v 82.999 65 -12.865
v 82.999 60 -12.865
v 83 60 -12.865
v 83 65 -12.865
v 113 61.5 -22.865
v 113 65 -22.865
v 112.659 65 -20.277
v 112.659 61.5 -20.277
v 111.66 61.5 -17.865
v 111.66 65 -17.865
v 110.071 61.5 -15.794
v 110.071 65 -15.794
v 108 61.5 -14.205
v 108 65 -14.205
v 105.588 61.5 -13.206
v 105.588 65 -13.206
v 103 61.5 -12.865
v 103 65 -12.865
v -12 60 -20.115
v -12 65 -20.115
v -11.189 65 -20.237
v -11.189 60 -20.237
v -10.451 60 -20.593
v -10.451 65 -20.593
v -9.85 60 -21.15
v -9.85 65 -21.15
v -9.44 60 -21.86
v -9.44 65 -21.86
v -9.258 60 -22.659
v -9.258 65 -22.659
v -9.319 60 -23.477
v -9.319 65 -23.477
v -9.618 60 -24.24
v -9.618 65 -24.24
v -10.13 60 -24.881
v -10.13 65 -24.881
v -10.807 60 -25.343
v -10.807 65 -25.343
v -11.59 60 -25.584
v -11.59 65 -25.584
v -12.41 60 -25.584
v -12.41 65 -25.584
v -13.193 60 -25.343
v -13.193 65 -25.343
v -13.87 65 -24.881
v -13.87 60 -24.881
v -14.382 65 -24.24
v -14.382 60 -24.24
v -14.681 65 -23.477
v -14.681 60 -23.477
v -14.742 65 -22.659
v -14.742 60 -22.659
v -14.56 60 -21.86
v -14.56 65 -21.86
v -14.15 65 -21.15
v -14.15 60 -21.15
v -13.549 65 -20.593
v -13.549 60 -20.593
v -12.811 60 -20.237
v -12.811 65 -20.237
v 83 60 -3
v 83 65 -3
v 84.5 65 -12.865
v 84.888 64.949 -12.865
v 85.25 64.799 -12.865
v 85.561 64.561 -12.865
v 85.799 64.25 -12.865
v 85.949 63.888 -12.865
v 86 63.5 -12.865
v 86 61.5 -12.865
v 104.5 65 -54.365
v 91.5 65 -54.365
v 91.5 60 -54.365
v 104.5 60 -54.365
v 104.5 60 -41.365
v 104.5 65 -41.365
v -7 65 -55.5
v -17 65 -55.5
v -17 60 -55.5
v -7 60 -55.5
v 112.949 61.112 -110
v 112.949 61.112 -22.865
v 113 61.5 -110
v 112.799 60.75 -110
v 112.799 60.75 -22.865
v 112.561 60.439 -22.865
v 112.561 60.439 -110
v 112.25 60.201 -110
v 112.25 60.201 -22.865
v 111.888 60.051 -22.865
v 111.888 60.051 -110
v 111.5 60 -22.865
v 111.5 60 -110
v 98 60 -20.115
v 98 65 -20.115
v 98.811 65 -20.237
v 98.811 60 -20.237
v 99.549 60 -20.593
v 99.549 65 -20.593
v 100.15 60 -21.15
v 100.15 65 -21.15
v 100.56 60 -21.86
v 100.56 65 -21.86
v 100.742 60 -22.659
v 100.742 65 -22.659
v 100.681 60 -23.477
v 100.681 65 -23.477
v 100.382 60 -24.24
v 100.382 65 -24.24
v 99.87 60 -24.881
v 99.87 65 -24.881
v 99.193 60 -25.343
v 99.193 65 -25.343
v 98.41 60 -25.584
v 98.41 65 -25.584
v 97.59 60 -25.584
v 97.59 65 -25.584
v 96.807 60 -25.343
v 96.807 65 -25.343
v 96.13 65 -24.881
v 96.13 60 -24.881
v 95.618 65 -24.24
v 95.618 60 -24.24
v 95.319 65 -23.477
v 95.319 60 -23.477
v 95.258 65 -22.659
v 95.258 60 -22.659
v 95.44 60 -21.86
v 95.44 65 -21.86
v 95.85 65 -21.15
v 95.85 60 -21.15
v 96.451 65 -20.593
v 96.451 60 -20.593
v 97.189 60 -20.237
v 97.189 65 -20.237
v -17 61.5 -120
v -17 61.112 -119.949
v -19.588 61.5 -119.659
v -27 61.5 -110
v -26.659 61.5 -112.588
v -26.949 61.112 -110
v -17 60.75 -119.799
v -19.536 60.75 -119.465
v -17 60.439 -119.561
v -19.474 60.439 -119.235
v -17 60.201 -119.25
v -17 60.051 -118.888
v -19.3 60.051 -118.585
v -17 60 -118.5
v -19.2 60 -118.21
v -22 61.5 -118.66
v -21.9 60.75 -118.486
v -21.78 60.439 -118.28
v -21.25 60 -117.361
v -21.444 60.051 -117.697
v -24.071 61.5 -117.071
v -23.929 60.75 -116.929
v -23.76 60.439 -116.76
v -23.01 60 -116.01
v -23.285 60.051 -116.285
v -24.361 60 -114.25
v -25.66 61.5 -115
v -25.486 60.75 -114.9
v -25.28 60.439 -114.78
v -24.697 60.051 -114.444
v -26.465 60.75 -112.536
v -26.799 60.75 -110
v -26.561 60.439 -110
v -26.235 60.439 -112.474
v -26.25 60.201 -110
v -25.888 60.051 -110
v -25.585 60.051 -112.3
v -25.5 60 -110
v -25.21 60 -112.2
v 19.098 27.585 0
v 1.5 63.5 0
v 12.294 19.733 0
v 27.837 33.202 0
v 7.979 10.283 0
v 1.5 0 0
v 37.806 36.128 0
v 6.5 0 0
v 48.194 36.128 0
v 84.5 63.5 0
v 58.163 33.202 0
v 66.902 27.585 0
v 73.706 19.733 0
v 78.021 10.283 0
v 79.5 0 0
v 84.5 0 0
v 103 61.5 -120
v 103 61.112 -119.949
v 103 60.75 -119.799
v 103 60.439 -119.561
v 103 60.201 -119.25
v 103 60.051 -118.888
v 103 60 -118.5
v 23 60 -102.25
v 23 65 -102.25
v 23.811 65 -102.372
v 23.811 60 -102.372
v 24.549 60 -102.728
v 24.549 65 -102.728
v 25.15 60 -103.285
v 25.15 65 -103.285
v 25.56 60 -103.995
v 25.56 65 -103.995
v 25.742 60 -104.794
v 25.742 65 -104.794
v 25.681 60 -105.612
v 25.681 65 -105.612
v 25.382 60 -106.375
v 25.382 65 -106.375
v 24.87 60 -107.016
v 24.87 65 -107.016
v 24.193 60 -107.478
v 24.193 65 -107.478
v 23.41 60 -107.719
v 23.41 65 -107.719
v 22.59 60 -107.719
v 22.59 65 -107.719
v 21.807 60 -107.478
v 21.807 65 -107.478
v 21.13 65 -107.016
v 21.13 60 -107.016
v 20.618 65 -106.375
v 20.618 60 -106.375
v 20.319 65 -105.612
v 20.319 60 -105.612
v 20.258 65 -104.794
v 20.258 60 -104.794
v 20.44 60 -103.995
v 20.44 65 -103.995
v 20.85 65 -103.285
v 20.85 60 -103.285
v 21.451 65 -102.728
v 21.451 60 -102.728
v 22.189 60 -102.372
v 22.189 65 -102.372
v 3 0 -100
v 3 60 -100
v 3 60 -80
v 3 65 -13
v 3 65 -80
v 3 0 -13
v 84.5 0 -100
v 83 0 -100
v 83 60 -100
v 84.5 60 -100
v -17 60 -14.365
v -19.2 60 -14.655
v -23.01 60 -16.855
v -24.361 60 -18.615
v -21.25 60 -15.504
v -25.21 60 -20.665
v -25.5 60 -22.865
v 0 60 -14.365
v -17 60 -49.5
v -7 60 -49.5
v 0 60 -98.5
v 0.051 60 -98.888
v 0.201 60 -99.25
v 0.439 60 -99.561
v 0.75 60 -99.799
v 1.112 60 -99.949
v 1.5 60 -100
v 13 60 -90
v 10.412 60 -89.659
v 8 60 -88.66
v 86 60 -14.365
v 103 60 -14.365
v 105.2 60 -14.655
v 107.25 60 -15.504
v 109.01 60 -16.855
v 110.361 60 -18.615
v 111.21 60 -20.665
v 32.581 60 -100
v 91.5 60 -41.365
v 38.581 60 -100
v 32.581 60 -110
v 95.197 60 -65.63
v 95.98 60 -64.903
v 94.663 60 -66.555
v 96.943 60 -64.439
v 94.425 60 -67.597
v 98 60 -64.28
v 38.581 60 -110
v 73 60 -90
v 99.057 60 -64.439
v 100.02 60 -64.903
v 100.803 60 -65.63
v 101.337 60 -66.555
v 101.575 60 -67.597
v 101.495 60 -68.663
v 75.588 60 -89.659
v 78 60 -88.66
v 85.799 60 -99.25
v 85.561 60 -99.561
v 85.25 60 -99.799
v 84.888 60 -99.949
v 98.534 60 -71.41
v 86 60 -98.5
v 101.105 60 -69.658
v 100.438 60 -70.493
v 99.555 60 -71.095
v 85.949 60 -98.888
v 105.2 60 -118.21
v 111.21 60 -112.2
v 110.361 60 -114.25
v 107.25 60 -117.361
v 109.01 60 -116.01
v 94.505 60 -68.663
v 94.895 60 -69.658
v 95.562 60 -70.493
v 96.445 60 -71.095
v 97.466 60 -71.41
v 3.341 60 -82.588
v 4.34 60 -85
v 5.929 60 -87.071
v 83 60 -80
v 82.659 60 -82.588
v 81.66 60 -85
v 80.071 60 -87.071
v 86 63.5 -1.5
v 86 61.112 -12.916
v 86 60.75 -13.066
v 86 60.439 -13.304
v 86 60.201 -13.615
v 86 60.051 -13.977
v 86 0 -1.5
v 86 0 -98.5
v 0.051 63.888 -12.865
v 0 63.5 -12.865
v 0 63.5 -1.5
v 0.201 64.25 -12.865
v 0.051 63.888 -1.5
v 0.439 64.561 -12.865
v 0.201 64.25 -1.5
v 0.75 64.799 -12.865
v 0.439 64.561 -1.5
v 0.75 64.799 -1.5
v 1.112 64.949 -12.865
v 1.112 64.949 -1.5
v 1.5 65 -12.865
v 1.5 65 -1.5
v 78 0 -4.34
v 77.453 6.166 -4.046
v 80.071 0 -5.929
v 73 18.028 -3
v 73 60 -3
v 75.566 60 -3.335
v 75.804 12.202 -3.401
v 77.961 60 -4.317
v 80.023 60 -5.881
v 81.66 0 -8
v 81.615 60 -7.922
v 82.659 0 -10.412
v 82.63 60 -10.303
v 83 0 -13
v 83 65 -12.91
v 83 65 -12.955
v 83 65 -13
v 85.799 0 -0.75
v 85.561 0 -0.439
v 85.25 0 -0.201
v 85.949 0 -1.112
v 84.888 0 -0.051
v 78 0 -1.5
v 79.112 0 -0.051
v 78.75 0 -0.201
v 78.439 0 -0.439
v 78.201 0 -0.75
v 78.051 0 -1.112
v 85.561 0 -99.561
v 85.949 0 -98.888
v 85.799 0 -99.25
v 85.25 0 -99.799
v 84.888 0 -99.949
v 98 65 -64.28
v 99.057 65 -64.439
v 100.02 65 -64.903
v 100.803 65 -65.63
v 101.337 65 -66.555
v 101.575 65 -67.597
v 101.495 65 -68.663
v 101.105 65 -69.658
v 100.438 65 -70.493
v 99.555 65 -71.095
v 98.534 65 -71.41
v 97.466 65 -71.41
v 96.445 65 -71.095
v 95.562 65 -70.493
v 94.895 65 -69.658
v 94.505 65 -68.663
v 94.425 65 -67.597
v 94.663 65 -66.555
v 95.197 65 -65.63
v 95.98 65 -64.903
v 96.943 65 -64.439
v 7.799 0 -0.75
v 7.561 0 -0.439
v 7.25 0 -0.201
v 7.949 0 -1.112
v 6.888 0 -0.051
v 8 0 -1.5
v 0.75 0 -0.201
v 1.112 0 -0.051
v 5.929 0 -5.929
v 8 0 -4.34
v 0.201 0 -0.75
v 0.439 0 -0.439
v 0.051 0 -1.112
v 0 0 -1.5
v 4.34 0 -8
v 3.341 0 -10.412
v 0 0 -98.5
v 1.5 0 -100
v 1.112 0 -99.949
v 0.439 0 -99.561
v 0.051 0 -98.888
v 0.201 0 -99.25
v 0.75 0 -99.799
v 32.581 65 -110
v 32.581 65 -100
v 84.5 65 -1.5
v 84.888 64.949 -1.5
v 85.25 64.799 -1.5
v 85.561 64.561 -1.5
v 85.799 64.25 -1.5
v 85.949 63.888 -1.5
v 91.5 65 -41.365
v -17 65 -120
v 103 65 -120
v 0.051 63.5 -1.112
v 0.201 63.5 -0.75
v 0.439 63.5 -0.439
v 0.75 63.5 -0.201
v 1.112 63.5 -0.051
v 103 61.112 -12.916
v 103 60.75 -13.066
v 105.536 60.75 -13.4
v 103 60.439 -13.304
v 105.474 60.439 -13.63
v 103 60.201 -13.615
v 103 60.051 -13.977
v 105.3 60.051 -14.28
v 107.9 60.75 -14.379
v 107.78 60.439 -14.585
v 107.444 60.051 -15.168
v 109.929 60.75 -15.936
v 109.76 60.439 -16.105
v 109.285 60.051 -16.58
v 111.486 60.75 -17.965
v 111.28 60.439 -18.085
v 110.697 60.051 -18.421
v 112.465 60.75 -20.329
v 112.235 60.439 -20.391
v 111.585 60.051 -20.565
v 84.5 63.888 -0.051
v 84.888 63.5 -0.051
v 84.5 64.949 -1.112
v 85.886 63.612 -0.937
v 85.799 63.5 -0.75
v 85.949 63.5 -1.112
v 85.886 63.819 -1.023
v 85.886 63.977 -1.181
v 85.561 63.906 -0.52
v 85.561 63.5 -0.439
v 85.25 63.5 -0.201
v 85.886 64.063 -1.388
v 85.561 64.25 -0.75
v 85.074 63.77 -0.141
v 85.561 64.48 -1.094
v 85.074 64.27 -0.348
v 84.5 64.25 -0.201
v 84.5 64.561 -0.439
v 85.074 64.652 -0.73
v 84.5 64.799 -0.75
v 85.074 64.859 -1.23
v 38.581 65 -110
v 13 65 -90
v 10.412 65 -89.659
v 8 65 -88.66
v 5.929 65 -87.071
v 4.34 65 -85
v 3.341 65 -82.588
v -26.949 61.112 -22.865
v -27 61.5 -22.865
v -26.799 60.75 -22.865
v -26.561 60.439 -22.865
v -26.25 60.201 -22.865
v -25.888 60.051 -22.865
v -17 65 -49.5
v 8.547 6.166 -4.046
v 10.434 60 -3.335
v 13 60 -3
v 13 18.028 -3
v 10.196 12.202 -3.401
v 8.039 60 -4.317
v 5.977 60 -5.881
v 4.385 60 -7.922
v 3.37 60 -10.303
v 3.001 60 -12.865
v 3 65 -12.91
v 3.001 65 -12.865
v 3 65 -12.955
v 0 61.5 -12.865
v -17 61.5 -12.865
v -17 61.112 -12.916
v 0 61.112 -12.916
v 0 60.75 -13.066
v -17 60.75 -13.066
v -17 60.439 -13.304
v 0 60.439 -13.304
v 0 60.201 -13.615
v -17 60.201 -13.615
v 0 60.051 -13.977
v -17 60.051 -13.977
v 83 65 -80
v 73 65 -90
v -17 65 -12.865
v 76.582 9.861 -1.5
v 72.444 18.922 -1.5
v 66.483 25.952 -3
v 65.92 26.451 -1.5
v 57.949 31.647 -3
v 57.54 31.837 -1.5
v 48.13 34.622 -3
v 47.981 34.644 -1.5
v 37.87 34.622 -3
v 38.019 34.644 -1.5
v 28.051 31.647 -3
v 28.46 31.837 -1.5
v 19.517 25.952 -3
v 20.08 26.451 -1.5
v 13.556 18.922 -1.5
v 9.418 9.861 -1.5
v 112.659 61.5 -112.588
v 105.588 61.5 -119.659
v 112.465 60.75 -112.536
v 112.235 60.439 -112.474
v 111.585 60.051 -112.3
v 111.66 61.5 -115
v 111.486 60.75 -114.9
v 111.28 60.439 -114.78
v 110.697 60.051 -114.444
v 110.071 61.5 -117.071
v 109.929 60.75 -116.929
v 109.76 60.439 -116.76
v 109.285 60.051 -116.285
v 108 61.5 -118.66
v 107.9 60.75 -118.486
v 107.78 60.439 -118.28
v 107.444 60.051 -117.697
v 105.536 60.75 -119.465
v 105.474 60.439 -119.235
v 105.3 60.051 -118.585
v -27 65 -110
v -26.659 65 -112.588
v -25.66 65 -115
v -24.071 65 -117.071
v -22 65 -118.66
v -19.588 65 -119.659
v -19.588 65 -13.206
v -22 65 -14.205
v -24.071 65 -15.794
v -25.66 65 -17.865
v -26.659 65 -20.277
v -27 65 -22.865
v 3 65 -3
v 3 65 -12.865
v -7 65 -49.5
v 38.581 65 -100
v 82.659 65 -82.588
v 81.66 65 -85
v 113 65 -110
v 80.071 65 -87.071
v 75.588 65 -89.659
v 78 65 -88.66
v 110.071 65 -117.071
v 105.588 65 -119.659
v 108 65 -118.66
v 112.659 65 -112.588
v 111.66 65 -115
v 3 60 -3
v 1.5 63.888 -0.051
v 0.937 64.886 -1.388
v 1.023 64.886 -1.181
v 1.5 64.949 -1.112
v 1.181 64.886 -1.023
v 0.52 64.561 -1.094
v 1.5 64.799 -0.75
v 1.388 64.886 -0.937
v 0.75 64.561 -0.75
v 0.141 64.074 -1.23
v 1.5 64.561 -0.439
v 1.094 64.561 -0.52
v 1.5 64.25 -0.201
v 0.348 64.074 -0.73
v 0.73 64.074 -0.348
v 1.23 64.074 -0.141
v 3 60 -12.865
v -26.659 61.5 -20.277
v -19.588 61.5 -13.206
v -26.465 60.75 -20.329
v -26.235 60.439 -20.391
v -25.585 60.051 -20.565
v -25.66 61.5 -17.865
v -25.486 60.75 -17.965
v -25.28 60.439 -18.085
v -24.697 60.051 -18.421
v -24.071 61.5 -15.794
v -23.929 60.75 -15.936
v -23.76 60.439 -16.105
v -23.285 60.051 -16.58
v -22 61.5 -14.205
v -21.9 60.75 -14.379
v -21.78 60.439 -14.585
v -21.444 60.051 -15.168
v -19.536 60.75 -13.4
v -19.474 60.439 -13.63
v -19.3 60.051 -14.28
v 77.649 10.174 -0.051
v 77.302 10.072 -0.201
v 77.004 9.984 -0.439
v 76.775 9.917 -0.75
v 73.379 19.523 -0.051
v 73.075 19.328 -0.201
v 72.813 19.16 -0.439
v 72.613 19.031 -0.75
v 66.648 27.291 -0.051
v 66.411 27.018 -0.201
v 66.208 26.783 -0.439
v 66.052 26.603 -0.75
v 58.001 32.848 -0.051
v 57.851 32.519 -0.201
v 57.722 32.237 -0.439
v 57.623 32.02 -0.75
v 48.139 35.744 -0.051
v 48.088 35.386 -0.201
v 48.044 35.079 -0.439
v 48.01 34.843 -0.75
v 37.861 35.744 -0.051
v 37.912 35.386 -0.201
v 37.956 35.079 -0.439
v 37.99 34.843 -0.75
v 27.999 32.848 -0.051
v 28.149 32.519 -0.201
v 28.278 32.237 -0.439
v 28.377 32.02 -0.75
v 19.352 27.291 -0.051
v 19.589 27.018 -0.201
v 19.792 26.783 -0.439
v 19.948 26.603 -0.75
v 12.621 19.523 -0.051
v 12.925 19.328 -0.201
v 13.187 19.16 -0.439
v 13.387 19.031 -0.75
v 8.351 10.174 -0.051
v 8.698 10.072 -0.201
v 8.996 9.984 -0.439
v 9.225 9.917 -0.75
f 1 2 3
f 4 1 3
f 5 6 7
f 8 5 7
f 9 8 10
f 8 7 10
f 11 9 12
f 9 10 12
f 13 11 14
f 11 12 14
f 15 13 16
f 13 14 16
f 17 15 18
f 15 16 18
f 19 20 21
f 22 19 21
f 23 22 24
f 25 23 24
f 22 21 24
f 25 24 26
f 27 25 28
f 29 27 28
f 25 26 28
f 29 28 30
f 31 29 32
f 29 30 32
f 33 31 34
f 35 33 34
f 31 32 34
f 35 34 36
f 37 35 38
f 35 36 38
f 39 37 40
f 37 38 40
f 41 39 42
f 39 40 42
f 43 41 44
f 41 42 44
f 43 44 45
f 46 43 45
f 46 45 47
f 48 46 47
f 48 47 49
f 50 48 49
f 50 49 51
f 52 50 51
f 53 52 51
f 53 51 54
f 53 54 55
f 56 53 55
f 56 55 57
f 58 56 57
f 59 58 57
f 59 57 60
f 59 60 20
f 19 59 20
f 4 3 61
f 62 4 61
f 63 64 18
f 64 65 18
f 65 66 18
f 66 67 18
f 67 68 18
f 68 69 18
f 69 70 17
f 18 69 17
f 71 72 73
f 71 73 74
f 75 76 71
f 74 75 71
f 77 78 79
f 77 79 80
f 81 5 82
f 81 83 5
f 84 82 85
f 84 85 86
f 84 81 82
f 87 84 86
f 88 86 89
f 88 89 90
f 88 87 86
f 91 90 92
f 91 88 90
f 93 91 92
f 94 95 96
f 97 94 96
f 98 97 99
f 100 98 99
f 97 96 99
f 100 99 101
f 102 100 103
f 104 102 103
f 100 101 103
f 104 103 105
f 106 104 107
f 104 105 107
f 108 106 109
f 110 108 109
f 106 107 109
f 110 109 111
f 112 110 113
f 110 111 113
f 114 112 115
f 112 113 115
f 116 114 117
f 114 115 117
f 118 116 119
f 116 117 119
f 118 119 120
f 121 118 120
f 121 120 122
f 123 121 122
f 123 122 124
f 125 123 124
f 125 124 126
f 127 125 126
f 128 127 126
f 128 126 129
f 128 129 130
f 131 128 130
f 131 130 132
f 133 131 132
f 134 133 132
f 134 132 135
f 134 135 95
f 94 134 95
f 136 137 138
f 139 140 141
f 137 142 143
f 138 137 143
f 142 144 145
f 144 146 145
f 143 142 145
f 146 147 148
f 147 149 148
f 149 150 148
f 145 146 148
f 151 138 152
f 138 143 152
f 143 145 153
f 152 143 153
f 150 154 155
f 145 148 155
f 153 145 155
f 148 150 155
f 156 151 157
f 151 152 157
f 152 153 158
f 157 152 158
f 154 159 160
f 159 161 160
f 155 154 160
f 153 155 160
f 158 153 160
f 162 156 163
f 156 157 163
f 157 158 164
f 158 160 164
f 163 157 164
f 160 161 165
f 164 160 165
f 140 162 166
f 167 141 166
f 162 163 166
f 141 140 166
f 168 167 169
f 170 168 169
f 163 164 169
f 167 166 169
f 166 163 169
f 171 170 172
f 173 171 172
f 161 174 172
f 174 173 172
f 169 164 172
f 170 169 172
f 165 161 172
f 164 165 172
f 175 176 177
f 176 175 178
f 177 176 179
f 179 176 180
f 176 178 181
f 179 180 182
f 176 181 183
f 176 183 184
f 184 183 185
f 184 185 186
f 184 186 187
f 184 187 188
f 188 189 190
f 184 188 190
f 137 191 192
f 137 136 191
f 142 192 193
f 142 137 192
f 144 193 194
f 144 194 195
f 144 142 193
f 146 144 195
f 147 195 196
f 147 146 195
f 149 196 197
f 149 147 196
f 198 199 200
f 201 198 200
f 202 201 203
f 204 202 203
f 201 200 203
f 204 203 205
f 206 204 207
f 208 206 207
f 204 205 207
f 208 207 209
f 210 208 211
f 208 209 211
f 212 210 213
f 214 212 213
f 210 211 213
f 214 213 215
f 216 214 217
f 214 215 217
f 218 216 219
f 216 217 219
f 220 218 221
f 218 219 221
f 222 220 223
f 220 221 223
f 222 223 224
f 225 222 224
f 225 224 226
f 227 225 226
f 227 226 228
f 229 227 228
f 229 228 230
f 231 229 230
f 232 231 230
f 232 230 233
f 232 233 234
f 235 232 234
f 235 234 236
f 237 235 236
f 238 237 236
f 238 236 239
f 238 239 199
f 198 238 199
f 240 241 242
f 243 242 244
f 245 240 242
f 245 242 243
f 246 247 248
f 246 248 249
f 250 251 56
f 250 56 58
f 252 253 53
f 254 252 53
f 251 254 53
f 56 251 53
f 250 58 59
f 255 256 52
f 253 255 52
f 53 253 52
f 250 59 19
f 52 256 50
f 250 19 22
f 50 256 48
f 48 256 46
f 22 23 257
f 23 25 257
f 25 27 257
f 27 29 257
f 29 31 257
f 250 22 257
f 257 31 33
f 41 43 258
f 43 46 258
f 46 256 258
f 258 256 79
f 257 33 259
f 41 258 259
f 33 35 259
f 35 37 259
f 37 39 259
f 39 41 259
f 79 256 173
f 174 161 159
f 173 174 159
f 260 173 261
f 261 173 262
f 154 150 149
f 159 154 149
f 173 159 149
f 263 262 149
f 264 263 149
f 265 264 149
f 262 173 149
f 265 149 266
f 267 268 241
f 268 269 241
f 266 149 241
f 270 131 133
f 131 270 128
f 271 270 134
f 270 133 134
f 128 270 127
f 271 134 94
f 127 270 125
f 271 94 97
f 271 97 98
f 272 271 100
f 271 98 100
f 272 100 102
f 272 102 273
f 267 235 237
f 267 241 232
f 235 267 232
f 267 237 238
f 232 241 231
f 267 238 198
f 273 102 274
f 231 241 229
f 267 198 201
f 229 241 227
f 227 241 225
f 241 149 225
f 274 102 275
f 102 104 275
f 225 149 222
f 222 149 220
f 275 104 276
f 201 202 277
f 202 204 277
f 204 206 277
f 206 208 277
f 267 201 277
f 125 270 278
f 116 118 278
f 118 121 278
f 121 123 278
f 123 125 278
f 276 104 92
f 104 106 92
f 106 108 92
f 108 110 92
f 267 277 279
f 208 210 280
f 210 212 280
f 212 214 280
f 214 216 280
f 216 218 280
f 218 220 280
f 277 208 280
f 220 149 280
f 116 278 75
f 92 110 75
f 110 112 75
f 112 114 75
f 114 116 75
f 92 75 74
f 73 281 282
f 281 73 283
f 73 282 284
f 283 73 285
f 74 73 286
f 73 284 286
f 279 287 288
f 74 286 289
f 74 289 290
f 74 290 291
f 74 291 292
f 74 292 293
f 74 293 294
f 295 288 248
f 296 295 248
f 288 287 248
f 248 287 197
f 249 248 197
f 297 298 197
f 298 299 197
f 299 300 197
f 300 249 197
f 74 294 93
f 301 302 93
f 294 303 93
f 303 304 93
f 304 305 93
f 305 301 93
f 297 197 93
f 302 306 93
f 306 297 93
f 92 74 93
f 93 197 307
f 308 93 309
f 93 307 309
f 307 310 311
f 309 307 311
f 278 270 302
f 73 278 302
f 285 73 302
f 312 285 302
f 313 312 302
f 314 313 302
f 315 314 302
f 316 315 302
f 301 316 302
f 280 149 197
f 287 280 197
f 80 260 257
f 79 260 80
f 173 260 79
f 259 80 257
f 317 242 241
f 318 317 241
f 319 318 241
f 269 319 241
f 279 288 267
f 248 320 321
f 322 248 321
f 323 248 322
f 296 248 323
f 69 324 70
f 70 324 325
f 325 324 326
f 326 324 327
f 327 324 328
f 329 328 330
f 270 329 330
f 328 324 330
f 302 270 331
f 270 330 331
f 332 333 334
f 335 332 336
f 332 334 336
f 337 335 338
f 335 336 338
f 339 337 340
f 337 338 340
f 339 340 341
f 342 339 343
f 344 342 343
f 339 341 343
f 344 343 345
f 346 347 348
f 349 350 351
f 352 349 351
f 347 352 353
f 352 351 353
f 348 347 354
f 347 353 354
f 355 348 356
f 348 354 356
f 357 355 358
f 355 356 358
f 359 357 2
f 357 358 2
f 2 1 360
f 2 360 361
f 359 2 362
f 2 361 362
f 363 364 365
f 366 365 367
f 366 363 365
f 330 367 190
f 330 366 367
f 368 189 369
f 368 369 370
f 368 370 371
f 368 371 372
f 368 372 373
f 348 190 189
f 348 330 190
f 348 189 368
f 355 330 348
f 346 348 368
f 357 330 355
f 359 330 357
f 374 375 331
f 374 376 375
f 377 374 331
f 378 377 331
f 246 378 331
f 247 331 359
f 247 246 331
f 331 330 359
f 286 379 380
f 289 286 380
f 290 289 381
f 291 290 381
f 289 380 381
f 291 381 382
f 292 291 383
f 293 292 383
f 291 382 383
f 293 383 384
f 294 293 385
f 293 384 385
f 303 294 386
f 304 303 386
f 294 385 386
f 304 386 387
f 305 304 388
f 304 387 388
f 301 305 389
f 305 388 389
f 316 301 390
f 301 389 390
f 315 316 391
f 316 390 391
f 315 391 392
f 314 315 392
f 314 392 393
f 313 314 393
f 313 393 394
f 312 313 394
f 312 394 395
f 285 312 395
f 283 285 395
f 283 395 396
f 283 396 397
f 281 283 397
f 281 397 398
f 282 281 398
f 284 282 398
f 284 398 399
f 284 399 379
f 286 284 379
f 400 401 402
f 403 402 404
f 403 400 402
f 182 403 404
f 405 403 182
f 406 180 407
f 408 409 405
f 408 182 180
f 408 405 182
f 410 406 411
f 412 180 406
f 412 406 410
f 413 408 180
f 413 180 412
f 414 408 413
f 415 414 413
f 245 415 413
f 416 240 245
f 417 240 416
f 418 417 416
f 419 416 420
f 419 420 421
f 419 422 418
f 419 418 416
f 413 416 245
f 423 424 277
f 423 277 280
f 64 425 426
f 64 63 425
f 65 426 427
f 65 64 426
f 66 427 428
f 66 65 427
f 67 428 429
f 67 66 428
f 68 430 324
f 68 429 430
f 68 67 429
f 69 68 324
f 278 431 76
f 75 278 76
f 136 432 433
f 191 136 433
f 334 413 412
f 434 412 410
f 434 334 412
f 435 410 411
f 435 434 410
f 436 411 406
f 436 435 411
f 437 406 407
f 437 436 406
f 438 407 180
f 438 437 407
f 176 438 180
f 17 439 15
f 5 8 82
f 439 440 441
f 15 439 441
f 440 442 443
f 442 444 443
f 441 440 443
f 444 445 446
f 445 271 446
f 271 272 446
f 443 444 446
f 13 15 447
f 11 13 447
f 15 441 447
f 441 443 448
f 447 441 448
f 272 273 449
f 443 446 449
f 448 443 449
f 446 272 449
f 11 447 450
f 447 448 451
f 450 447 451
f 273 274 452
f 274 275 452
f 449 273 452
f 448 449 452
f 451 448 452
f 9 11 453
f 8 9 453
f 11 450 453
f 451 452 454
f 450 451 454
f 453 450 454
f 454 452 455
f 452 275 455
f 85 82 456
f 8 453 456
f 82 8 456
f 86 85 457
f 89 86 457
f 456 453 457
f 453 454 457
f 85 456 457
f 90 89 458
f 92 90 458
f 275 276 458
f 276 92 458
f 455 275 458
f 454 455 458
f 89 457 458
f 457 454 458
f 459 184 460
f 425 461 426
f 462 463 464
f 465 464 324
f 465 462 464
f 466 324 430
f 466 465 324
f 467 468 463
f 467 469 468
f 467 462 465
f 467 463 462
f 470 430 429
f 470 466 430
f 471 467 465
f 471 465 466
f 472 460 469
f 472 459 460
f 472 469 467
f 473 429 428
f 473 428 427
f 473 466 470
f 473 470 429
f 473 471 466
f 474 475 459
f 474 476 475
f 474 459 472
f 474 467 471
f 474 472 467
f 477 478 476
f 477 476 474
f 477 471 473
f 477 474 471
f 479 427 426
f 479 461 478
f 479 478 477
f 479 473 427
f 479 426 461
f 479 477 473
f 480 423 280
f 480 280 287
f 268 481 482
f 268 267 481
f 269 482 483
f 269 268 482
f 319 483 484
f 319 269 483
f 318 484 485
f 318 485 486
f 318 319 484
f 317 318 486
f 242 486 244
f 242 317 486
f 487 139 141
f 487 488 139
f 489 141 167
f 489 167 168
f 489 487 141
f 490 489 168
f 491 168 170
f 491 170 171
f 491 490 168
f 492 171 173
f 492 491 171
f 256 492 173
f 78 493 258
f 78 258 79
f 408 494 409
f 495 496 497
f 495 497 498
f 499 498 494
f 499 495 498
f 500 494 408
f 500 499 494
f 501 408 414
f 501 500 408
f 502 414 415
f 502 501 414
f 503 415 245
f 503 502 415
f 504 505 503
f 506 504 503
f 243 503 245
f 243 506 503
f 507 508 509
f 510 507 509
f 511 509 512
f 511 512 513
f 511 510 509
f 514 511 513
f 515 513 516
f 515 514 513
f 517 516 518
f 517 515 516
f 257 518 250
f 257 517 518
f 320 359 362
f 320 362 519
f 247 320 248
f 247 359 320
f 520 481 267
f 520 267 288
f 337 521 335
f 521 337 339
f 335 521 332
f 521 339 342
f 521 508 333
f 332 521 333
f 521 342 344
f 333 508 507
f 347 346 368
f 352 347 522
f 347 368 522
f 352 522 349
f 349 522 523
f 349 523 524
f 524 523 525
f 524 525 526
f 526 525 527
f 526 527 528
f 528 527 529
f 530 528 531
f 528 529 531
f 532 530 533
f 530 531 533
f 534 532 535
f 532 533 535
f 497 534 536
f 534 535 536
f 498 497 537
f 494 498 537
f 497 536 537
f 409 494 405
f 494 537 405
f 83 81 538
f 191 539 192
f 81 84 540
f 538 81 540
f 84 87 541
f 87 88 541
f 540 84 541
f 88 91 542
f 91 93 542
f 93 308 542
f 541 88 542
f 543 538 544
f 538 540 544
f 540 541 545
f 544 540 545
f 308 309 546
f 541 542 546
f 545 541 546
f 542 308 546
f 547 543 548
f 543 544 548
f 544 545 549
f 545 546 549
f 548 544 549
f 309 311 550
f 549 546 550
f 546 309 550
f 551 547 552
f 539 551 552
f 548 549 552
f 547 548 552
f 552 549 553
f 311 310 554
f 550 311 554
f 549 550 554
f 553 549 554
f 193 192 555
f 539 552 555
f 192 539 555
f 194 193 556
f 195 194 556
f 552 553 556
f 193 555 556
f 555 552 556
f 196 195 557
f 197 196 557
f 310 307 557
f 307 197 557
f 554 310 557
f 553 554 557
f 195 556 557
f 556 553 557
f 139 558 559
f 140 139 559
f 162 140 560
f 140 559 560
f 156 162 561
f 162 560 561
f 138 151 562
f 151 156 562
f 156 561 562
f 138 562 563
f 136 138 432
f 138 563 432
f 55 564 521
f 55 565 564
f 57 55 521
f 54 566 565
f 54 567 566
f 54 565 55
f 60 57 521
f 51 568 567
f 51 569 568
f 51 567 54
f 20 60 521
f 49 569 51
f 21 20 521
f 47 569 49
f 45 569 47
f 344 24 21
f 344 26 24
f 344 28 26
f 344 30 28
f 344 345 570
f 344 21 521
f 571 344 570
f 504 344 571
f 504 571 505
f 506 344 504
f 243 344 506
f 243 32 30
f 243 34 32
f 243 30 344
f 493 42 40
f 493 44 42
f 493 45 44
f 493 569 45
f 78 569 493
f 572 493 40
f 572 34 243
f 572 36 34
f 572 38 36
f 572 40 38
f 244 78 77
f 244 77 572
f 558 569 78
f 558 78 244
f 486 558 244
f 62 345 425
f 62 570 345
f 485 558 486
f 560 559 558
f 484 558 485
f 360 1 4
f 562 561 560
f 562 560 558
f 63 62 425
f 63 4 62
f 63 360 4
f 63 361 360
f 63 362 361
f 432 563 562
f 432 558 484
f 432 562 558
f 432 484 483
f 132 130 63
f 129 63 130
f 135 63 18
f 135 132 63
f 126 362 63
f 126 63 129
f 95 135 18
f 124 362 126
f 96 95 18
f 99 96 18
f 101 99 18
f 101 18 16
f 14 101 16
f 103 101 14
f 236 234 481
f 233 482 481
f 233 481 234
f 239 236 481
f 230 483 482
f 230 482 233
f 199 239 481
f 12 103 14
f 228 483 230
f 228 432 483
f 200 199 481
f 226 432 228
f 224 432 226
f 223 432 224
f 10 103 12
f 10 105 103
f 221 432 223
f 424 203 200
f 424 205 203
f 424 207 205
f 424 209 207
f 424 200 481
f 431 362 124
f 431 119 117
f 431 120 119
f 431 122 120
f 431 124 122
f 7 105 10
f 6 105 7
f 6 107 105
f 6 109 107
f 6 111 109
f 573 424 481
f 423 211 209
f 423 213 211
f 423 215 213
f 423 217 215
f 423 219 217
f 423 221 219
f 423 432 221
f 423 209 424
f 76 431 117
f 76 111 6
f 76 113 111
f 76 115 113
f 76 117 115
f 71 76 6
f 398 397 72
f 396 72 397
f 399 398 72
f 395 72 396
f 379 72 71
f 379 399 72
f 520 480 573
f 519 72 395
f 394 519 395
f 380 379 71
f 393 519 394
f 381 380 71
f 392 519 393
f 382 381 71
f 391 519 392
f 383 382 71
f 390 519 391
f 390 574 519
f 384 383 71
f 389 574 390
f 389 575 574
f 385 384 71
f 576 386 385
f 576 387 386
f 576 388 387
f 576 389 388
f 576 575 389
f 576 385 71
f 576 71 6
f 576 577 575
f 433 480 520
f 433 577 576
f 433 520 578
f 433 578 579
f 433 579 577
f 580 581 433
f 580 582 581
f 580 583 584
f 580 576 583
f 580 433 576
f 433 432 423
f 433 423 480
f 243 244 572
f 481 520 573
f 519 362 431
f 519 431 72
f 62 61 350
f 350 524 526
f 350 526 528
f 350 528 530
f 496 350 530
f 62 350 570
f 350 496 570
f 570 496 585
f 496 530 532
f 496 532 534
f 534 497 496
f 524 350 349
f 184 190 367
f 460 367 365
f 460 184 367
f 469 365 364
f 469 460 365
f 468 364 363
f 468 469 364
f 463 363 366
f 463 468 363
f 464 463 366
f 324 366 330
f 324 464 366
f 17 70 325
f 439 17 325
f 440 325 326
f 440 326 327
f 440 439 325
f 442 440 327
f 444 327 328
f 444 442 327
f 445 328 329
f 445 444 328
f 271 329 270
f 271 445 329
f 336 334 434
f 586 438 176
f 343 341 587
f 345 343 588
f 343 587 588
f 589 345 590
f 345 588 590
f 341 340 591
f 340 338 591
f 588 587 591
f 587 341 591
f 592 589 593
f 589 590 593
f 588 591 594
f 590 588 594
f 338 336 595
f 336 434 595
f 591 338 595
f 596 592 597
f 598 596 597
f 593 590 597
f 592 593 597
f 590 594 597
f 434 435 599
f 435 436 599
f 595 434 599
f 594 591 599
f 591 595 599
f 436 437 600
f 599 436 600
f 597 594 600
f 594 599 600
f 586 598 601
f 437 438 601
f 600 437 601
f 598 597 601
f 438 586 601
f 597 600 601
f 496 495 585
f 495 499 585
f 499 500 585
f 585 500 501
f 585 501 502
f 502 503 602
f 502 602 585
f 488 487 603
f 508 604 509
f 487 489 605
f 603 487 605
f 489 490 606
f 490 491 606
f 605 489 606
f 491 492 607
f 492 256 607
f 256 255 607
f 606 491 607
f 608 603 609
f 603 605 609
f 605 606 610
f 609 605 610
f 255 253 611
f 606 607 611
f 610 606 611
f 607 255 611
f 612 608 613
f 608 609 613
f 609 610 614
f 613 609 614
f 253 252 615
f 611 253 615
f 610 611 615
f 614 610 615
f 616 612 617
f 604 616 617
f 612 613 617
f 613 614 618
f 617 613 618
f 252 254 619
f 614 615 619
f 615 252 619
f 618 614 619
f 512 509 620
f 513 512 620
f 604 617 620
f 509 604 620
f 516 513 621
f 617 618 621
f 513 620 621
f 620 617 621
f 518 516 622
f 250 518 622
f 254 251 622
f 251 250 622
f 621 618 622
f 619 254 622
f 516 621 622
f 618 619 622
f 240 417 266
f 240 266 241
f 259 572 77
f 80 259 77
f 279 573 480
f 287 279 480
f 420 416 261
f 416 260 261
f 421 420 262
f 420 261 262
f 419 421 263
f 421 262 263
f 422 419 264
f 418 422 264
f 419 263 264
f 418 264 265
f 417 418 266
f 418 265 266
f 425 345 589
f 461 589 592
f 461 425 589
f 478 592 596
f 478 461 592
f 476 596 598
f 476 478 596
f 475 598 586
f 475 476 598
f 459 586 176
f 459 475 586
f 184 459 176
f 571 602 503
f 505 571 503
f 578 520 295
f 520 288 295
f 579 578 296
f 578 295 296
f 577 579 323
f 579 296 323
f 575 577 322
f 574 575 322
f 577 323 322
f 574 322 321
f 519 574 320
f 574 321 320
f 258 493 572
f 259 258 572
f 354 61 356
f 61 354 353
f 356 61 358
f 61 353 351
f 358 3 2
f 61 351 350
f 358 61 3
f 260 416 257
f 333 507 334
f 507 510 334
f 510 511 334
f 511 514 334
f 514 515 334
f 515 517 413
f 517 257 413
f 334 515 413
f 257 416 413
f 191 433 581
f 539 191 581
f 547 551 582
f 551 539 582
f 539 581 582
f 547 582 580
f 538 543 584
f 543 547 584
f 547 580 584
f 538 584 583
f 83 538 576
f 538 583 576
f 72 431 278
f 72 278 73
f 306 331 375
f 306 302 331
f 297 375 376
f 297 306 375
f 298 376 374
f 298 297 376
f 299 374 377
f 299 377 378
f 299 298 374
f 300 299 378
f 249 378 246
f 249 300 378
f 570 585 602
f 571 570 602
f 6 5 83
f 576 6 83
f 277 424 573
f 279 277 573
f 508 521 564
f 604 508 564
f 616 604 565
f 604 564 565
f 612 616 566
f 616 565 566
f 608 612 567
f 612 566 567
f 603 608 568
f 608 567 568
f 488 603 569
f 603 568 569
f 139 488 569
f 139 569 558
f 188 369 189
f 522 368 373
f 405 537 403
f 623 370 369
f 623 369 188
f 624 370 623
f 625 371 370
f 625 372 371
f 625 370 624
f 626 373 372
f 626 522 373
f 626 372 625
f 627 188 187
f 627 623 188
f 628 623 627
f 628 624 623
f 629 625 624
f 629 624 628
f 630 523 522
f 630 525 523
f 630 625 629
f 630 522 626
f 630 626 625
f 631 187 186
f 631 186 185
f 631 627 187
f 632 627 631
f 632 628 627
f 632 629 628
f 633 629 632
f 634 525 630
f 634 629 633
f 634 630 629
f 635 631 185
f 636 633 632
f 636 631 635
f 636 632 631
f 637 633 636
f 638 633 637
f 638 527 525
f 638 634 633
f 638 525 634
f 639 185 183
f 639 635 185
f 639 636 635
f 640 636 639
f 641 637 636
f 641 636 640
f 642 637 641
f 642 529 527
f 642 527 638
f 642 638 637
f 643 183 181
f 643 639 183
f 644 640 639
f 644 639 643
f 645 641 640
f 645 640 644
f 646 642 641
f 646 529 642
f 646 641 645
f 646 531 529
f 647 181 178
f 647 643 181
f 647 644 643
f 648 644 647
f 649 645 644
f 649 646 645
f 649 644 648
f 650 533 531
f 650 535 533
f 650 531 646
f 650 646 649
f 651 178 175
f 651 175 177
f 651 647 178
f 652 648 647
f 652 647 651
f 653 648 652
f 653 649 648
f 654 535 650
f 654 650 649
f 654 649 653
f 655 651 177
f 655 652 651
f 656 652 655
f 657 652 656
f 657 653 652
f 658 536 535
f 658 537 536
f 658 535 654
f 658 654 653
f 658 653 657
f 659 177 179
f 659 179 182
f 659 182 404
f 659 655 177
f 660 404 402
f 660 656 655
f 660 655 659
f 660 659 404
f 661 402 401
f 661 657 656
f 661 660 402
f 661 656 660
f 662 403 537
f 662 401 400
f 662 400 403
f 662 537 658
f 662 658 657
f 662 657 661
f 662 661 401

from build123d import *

# Parameters (mm, degrees)
BOSS_EXTRUDE1_DEPTH = 60
SKETCH2_W           = 30
SKETCH2_H           = 107.13499281
BOSS_EXTRUDE2_DEPTH = 5
SKETCH3_W           = 80
SKETCH3_H           = 30
BOSS_EXTRUDE3_DEPTH = 5
FILLET2_R           = 10
BOSS_EXTRUDE4_DEPTH = 5
CUT_EXTRUDE2_DEPTH  = 5
SKETCH7_R           = 2.75
CUT_EXTRUDE3_DEPTH  = 178.183520713
SKETCH8_W           = 10
SKETCH8_H           = 6
SKETCH8_W_2         = 6
SKETCH8_H_2         = 10
CUT_EXTRUDE4_DEPTH  = 178.183520713
SKETCH10_R          = 3.585
SKETCH10_W          = 13
SKETCH10_H          = 13
CUT_EXTRUDE5_DEPTH  = 178.183520713
FILLET3_R           = 1.5


with BuildPart() as part:
    # Sketch1 → Boss-Extrude1 (new body)
    with BuildSketch(Plane(origin=(0, 0, 0), x_dir=(1, 0, 0), z_dir=(0, 1, 0))):
        Polygon((0, 0), (0, 100), (3, 100), (3, 3), (83, 3), (83, 100), (86, 100), (86, 0), align=None)
    extrude(amount=BOSS_EXTRUDE1_DEPTH)

    # Sketch2 → Boss-Extrude2 (add)
    with BuildSketch(Plane(origin=(0, 60, 0), x_dir=(1, 0, 0), z_dir=(0, 1, 0))):
        with Locations((98, 66.432503591)):
            Rectangle(SKETCH2_W, SKETCH2_H)
        with Locations((-12, 66.432503591)):
            Rectangle(SKETCH2_W, SKETCH2_H)
    extrude(amount=BOSS_EXTRUDE2_DEPTH)

    # Sketch3 → Boss-Extrude3 (add)
    with BuildSketch(Plane(origin=(0, 65, 0), x_dir=(1, 0, 0), z_dir=(0, 1, 0))):
        with Locations((43, 104.999999996)):
            Rectangle(SKETCH3_W, SKETCH3_H)
    extrude(amount=-BOSS_EXTRUDE3_DEPTH)

    # Fillet2
    fillet2_edges = [part.edges().sort_by_distance(p)[0] for p in [
        (83, 30, -3),
        (3, 30, -3),
        (83, 62.5, -89.999999996),
        (3, 62.5, -89.999999996),
    ]]
    fillet(fillet2_edges, radius=FILLET2_R)
    fillet2_2_edges = [part.edges().sort_by_distance(p)[0] for p in [
        (113, 62.5, -119.999999996),
        (-27, 62.5, -119.999999996),
        (113, 62.5, -12.865007186),
        (-27, 62.5, -12.865007186),
    ]]
    fillet(fillet2_2_edges, radius=FILLET2_R)

    # Sketch5 → Boss-Extrude4 (add)
    with BuildSketch(Plane(origin=(0, 60, 0), x_dir=(1, 0, 0), z_dir=(0, 1, 0))):
        Polygon((0, 12.865007186), (0, 0), (86, 0), (86, 12.865007186), (83, 12.865007186), (83, 3), (3, 3), (3, 12.865007186), align=None)
    extrude(amount=BOSS_EXTRUDE4_DEPTH)

    # Sketch6 → Cut-Extrude2 (cut)
    with BuildSketch(Plane.XY):
        with BuildLine():
            Line((8, 0), (78, 0))
            ThreePointArc((78, 0), (43, 35), (8, 0))
        make_face()
    extrude(amount=-CUT_EXTRUDE2_DEPTH, mode=Mode.SUBTRACT)

    # Sketch7 → Cut-Extrude3 (cut, through all)
    with BuildSketch(Plane(origin=(0, 65, 0), x_dir=(1, 0, 0), z_dir=(0, 1, 0))):
        with Locations((-12, 22.865007186)):
            Circle(SKETCH7_R)
        with Locations((23, 104.999999996)):
            Circle(SKETCH7_R)
        with Locations((98, 22.865007186)):
            Circle(SKETCH7_R)
    extrude(amount=-CUT_EXTRUDE3_DEPTH, mode=Mode.SUBTRACT)

    # Sketch8 → Cut-Extrude4 (cut, through all)
    with BuildSketch(Plane(origin=(0, 65, 0), x_dir=(1, 0, 0), z_dir=(0, 1, 0))):
        with Locations((-12, 52.499999996)):
            Rectangle(SKETCH8_W, SKETCH8_H)
        with Locations((35.581142125, 104.999999996)):
            Rectangle(SKETCH8_W_2, SKETCH8_H_2)
    extrude(amount=-CUT_EXTRUDE4_DEPTH, mode=Mode.SUBTRACT)

    # Sketch10 → Cut-Extrude5 (cut, through all)
    with BuildSketch(Plane(origin=(0, 65, 0), x_dir=(1, 0, 0), z_dir=(0, 1, 0))):
        with Locations((98, 67.865007186)):
            Circle(SKETCH10_R)
        with Locations((98, 47.865007186)):
            Rectangle(SKETCH10_W, SKETCH10_H)
    extrude(amount=-CUT_EXTRUDE5_DEPTH, mode=Mode.SUBTRACT)

    # Fillet3
    fillet3_edges = [part.edges().sort_by_distance(p)[0] for p in [
        (-8.5, 60, -12.865007186),
        (-24.071067812, 60, -15.793939374),
        (-27, 60, -66.432503591),
        (-24.071067812, 60, -117.071067808),
        (43, 60, -119.999999996),
        (110.071067812, 60, -117.071067808),
        (113, 60, -66.432503591),
        (94.5, 60, -12.865007186),
        (110.071067812, 60, -15.793939374),
        (0, 32.5, 0),
        (0, 65, -6.432503593),
        (43, 65, 0),
        (86, 32.5, 0),
        (86, 65, -6.432503593),
        (0, 30, -100),
        (86, 30, -100),
        (43, 35, 0),
    ]]
    fillet(fillet3_edges, radius=FILLET3_R)


solid = part.part
